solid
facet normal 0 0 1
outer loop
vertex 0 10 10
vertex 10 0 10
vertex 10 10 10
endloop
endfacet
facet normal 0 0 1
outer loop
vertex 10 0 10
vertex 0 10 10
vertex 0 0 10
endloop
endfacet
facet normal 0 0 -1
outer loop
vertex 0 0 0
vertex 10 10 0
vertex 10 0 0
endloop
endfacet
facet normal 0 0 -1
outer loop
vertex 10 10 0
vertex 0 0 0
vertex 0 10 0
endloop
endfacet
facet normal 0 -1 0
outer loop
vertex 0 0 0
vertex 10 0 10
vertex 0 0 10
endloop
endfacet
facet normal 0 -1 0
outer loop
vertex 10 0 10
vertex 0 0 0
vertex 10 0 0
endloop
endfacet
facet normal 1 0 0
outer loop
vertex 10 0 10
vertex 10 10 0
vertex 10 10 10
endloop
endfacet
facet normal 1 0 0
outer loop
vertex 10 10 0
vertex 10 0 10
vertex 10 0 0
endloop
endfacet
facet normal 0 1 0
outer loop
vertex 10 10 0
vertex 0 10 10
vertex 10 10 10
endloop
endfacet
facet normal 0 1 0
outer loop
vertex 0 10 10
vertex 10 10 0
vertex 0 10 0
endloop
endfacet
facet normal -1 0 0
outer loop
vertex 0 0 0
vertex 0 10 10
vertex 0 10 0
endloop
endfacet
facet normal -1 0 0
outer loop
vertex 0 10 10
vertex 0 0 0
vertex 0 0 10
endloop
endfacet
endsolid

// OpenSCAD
// A % background part is skipped (status skipped-background) even though it
// overlaps part 1.
cube(10);
%translate([5, 0, 0]) cube(10);
